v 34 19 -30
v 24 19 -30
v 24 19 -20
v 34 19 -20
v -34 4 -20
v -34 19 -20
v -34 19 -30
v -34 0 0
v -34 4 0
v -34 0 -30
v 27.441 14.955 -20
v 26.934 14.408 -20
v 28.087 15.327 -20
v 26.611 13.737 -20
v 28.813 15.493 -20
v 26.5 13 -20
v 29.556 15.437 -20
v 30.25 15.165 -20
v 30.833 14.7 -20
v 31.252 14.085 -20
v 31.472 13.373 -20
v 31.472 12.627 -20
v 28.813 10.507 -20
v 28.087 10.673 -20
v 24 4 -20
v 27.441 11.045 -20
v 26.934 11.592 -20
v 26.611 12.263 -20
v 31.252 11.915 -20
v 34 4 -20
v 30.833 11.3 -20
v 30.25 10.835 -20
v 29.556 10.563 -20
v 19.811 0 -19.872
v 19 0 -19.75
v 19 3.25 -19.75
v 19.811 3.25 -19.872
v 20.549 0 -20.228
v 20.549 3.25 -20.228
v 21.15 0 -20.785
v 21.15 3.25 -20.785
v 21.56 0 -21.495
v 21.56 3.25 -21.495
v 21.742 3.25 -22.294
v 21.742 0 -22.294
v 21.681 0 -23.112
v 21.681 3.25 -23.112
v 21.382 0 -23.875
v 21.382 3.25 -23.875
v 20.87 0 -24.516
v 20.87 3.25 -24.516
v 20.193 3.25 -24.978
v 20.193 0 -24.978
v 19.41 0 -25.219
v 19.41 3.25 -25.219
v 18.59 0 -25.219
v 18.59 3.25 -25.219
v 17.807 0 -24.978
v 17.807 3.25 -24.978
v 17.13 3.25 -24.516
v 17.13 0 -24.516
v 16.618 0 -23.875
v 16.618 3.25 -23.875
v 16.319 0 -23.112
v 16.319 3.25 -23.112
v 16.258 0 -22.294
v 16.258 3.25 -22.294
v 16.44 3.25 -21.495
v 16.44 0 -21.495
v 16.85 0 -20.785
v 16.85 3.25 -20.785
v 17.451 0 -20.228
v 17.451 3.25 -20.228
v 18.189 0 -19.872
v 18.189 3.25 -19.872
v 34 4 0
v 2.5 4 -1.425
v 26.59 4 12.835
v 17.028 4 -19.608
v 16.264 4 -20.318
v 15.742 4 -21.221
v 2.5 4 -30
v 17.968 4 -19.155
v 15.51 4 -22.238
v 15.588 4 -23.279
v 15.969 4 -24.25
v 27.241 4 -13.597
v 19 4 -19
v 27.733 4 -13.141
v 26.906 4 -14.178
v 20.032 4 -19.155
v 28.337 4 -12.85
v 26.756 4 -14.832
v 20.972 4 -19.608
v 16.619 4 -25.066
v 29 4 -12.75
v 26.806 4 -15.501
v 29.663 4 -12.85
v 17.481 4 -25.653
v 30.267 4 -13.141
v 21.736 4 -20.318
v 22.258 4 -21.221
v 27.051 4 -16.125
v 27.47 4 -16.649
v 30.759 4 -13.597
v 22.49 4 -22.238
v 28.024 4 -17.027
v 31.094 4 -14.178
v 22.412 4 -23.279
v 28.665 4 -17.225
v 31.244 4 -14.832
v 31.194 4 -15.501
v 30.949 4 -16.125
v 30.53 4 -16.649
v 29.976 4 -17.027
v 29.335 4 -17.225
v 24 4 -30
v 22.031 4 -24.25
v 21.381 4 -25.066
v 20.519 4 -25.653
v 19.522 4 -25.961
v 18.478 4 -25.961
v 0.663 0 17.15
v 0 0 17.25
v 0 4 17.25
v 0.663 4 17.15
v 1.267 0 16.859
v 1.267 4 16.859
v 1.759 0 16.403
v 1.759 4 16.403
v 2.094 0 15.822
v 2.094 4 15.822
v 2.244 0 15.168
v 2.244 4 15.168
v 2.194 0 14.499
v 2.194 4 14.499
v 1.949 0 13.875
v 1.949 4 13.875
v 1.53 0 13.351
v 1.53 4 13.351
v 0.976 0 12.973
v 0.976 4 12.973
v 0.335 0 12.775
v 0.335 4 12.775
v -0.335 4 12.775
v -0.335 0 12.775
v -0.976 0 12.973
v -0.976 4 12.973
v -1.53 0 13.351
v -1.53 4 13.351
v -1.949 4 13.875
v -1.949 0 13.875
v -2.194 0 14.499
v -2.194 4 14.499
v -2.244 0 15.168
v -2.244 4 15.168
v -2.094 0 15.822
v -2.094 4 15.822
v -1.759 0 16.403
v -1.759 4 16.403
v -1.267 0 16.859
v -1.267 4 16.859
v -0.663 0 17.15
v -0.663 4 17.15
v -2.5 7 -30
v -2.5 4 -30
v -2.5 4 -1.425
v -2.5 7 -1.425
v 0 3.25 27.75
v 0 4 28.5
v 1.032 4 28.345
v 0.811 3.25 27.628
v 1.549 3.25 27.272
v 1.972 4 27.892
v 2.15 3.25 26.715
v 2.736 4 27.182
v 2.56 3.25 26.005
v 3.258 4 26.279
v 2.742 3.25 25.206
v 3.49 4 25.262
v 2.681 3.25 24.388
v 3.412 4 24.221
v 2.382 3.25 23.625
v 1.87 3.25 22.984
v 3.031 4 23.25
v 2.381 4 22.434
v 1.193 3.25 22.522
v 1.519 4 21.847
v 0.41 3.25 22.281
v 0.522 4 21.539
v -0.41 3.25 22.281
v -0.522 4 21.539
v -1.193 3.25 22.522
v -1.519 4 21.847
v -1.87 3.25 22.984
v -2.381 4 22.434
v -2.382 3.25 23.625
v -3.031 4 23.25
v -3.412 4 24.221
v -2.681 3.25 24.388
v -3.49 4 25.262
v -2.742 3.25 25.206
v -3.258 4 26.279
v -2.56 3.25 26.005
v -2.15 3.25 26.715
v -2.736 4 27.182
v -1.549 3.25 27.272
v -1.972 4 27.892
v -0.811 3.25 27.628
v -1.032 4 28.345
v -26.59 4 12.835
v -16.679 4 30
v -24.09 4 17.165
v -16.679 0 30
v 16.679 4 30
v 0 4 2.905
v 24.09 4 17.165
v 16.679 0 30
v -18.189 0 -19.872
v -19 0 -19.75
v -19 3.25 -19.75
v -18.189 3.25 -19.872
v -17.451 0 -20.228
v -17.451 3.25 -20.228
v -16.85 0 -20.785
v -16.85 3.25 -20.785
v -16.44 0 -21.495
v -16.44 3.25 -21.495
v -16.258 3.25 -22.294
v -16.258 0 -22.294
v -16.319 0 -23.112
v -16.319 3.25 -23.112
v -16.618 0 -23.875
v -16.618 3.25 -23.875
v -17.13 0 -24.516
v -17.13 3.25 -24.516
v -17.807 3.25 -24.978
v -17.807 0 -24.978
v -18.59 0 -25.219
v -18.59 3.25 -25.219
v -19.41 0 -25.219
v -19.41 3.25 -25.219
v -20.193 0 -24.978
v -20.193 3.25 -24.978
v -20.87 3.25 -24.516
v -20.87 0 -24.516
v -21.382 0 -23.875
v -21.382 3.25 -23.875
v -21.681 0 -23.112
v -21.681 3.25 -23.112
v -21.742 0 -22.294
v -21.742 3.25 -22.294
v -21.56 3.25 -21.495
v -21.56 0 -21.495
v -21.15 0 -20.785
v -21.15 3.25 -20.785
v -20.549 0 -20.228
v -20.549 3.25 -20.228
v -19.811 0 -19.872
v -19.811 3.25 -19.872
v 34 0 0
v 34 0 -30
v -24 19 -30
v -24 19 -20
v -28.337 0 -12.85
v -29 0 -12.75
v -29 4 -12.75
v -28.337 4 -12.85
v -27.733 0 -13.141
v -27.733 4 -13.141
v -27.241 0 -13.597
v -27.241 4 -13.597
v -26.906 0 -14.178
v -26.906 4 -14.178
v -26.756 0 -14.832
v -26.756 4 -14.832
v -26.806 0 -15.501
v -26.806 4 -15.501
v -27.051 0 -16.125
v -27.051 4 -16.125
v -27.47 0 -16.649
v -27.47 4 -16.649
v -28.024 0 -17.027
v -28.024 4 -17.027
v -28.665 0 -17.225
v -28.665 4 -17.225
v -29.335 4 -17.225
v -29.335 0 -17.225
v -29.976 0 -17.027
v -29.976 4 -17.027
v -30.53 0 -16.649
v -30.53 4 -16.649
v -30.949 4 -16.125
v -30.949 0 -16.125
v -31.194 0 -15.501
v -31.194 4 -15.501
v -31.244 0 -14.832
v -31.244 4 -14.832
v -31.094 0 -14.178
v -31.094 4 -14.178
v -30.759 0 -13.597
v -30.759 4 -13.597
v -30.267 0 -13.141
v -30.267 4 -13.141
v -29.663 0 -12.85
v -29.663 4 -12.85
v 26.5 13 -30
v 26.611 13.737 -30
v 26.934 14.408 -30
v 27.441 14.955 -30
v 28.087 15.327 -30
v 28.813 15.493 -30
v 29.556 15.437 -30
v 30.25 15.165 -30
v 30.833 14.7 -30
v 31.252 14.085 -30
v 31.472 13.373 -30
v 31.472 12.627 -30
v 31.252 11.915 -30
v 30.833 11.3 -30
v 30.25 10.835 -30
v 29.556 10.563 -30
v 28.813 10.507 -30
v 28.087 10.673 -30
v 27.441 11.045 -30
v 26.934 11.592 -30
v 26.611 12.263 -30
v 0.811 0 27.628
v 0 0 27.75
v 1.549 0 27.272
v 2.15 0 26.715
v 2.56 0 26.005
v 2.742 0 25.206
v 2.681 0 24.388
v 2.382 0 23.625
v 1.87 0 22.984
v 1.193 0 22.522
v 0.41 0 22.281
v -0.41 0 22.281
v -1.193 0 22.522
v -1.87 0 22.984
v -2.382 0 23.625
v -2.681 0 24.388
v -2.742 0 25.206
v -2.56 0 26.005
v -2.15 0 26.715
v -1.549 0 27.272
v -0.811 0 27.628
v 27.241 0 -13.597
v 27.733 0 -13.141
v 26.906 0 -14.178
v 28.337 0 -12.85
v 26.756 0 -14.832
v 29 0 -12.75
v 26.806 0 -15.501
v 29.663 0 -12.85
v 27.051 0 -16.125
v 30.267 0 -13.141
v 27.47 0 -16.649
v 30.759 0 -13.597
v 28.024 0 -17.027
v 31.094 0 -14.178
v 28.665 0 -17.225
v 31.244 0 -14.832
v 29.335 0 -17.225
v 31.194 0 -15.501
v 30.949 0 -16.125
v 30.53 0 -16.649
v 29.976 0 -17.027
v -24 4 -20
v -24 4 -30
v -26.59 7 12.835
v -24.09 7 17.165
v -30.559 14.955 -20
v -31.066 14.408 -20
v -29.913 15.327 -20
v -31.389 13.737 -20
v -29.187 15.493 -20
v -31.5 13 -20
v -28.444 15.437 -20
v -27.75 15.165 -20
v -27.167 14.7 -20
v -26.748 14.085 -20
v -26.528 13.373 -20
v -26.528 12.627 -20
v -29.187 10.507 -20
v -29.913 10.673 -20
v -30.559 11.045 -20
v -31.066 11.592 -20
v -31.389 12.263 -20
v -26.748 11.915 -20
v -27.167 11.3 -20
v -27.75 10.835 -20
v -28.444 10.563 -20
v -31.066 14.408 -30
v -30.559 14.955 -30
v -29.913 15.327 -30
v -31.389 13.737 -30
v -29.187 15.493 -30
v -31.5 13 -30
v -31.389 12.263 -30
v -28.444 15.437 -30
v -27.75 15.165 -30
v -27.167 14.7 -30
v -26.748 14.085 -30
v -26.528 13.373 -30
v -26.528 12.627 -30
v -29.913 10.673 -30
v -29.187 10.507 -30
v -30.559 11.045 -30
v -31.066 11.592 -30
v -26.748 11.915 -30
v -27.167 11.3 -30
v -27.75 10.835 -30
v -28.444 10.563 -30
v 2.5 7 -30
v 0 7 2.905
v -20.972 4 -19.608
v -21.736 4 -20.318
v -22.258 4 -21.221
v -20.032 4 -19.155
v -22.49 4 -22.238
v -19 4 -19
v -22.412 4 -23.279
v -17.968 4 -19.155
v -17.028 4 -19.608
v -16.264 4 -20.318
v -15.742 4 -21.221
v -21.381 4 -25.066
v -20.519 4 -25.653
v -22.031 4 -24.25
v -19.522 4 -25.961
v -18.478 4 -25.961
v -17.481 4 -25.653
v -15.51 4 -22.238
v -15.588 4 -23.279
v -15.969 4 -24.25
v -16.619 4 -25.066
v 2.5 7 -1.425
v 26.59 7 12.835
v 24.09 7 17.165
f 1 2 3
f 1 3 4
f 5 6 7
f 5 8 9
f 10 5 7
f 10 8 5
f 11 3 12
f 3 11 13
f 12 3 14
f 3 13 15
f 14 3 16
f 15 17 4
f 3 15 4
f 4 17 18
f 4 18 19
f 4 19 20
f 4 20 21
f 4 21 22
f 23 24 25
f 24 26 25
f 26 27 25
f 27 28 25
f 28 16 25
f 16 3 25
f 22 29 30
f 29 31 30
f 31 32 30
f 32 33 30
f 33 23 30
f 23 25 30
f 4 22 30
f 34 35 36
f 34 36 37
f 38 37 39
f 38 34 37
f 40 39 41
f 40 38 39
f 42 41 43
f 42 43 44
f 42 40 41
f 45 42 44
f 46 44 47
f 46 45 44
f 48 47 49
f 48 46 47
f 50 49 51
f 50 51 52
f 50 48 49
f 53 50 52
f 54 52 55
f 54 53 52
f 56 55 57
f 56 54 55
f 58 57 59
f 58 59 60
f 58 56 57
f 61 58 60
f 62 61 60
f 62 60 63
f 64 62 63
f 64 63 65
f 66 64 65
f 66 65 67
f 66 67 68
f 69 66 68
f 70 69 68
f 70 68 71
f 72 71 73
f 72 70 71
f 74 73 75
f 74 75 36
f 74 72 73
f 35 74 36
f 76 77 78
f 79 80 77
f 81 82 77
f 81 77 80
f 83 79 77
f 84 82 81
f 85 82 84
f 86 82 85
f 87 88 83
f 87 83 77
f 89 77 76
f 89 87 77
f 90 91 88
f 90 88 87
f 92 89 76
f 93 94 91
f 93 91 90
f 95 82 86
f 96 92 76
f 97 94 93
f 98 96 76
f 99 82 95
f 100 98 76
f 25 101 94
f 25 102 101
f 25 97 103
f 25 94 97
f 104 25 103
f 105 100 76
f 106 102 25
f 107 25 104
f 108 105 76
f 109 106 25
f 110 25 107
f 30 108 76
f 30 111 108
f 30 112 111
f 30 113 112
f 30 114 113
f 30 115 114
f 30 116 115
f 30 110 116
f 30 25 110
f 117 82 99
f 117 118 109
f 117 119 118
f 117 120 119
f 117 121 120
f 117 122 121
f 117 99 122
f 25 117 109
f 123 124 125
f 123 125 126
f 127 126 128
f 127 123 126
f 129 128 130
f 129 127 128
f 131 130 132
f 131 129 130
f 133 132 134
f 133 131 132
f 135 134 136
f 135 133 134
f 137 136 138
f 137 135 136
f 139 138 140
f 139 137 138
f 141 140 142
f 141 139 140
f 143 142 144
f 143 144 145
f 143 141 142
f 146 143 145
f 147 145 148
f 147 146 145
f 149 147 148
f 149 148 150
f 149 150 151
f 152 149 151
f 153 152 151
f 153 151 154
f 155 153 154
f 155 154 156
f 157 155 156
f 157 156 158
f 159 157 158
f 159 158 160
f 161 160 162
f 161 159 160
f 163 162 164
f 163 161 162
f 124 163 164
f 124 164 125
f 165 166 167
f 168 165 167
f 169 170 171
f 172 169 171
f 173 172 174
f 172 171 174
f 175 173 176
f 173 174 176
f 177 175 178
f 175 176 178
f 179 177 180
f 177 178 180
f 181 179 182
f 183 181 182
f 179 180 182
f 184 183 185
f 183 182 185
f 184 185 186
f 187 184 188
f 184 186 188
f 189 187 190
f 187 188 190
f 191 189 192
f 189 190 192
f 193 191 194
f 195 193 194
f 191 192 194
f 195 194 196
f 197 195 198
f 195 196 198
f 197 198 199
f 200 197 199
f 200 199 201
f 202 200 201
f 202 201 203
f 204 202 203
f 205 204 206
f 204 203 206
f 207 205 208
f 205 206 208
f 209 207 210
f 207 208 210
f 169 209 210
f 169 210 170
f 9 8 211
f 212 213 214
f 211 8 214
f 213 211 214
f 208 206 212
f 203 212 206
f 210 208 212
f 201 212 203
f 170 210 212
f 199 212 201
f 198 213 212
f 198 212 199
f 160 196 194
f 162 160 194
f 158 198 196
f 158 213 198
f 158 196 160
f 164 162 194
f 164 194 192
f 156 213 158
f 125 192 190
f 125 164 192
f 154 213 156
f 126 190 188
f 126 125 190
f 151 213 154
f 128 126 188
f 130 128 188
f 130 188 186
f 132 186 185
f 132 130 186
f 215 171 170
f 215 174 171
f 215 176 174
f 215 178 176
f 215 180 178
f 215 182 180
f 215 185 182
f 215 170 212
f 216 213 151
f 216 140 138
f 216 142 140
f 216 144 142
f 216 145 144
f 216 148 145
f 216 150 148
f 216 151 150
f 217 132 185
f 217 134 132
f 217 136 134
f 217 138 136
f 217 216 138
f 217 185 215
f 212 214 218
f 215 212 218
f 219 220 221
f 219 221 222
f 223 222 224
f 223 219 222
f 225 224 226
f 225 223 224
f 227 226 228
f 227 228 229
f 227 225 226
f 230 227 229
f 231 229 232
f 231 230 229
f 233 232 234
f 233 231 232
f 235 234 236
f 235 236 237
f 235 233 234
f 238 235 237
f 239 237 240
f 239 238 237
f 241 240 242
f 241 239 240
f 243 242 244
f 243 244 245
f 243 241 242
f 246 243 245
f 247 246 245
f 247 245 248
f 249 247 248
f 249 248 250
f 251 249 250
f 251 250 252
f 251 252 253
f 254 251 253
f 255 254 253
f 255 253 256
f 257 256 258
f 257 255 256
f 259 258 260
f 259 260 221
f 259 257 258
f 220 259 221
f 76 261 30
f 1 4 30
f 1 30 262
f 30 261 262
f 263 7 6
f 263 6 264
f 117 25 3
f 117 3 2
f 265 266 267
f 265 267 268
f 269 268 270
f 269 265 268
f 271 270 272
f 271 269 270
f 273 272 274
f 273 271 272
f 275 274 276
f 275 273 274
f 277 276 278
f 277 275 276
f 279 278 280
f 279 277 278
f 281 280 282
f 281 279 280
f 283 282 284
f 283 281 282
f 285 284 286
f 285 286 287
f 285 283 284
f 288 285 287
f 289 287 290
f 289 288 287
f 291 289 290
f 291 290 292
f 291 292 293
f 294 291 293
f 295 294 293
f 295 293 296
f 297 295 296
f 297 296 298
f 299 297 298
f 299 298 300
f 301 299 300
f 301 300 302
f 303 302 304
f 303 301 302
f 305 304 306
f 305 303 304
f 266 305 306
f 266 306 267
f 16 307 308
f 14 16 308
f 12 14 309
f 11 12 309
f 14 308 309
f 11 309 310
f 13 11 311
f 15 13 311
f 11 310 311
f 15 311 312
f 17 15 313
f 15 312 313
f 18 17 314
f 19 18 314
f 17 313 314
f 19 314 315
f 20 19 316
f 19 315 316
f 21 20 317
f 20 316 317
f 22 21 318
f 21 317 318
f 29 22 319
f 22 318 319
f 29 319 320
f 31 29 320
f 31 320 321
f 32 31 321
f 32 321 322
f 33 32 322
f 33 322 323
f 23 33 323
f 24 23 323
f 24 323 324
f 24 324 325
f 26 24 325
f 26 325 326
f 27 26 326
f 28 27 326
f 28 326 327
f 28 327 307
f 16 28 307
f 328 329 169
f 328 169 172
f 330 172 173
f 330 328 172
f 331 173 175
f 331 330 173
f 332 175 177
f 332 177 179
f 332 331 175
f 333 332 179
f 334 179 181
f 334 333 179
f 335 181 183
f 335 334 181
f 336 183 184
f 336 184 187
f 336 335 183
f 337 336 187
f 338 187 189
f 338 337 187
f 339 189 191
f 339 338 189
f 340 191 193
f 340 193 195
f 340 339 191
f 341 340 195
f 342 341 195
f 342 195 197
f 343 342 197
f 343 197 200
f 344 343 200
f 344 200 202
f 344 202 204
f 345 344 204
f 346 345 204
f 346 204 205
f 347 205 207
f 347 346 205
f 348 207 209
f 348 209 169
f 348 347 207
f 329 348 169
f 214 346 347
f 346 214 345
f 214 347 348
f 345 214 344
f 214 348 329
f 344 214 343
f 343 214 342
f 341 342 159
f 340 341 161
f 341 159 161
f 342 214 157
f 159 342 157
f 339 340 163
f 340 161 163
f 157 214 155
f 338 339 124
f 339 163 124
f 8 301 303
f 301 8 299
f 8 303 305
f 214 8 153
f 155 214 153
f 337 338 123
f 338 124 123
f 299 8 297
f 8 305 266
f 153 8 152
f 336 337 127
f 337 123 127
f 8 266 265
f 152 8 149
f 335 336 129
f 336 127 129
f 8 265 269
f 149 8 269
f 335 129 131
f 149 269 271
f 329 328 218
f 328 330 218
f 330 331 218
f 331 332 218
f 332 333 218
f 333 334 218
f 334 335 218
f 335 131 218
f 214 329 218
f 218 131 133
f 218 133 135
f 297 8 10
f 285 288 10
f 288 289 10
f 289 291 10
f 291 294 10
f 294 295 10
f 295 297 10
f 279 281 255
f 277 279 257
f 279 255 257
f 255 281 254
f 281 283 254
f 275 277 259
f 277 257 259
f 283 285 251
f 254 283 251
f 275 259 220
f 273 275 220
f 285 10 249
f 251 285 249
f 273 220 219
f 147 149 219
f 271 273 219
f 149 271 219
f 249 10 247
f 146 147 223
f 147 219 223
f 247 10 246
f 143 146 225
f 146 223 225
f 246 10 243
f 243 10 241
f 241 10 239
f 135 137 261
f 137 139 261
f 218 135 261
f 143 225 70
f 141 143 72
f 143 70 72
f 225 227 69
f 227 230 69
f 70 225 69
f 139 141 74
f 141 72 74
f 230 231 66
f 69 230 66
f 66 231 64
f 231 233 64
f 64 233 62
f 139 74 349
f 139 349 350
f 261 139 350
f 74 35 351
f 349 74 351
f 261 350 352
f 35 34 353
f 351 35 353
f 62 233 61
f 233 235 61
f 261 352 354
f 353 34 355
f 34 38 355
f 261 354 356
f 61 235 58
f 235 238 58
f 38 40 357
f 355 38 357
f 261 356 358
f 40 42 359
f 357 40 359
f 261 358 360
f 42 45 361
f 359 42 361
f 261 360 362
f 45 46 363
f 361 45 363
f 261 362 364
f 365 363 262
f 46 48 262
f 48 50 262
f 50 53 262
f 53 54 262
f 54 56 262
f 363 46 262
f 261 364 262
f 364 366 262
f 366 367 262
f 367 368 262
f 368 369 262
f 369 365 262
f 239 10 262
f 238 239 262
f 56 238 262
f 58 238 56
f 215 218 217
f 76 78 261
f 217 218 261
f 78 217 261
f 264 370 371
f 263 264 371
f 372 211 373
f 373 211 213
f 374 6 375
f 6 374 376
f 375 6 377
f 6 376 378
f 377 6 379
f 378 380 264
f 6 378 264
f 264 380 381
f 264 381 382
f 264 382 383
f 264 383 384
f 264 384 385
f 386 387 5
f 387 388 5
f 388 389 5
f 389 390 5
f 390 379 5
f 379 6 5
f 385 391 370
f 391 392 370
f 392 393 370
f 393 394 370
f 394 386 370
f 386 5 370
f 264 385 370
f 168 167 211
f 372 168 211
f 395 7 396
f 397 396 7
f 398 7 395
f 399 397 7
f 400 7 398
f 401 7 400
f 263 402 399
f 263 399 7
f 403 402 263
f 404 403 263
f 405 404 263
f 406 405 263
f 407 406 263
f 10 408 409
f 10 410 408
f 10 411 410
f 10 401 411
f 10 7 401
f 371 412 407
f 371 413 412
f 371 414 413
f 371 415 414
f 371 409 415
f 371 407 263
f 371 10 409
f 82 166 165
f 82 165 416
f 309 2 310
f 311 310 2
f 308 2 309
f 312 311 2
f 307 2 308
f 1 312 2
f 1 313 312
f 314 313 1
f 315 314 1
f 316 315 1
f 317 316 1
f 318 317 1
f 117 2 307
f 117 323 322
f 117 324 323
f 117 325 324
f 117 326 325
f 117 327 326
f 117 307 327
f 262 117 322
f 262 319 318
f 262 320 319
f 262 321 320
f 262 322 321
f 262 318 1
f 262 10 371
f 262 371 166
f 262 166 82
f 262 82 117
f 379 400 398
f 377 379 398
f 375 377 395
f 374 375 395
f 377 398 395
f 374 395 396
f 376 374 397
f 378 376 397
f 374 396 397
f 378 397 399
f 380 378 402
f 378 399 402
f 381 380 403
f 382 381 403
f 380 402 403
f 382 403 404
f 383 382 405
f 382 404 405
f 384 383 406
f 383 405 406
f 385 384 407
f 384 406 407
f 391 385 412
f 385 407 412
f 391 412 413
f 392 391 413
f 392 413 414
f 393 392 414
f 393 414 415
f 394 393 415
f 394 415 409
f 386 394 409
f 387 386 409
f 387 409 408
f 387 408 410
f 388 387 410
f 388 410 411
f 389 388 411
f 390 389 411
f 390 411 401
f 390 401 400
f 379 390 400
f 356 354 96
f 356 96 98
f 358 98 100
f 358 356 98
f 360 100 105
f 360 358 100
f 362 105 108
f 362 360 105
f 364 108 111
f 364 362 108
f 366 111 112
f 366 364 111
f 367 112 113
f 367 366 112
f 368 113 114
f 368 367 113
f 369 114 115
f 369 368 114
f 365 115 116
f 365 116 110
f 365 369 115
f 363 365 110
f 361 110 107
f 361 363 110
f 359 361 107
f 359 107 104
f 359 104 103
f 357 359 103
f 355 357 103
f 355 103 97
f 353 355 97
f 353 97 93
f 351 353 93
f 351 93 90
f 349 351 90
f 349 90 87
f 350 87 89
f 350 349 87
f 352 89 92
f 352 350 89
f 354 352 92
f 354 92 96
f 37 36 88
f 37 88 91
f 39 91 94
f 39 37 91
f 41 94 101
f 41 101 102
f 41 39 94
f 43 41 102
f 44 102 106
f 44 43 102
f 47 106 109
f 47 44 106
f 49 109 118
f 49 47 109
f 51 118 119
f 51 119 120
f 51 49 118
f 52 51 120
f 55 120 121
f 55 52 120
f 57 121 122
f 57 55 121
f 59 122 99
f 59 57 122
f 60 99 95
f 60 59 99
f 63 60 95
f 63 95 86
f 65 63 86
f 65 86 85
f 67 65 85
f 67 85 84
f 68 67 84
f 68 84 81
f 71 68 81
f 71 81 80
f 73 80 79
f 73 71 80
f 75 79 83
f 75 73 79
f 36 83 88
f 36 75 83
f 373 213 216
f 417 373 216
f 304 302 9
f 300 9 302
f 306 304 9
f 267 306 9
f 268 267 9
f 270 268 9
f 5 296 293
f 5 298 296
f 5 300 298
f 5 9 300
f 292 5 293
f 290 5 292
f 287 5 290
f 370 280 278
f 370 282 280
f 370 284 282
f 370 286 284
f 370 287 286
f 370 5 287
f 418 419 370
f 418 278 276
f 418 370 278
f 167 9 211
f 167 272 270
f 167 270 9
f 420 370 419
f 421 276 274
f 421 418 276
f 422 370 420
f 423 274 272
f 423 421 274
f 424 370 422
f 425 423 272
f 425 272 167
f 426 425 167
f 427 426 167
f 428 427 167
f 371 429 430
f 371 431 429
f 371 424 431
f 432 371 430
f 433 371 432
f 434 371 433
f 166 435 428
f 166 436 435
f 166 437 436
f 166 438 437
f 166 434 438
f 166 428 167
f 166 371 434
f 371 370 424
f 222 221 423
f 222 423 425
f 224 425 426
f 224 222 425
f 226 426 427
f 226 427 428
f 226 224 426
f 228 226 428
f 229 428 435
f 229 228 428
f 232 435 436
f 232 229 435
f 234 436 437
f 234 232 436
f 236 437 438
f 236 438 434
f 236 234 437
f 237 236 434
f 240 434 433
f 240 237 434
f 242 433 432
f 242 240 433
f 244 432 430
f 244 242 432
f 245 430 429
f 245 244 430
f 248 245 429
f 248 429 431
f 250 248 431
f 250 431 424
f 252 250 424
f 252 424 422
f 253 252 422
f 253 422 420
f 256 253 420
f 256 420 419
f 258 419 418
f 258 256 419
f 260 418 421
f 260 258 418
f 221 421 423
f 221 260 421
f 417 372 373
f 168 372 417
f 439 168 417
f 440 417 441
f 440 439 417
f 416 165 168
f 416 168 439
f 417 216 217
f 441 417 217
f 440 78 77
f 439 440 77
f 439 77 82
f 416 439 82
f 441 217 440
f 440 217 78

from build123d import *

# Parameters (mm, degrees)
SKETCH1_R           = 2.75
SKETCH1_R_2         = 2.25
BOSS_EXTRUDE1_DEPTH = 4
BOSS_EXTRUDE2_DEPTH = 3
SKETCH3_W           = 10
SKETCH3_H           = 10
BOSS_EXTRUDE3_DEPTH = 15
SKETCH4_R           = 2.5
CUT_EXTRUDE1_DEPTH  = 72.533209071
CHAMFER1_SIZE       = 0.75


with BuildPart() as part:
    # Sketch1 → Boss-Extrude1 (new body)
    with BuildSketch(Plane(origin=(0, 0, 0), x_dir=(1, 0, 0), z_dir=(0, 1, 0))):
        Polygon((-16.679491924, -30), (16.679491924, -30), (34, 0), (34, 30), (-34, 30), (-34, 0), align=None)
        with Locations(Location((-19, 22.5, 0), (0, 0, 270))):
            Circle(SKETCH1_R, mode=Mode.SUBTRACT)
        with Locations(Location((19, 22.5, 0), (0, 0, 270))):
            Circle(SKETCH1_R, mode=Mode.SUBTRACT)
        with Locations(Location((0, -25, 0), (0, 0, 270))):
            Circle(SKETCH1_R, mode=Mode.SUBTRACT)
        with Locations(Location((-29, 15, 0), (0, 0, 270))):
            Circle(SKETCH1_R_2, mode=Mode.SUBTRACT)
        with Locations(Location((29, 15, 0), (0, 0, 270))):
            Circle(SKETCH1_R_2, mode=Mode.SUBTRACT)
        with Locations(Location((0, -15, 0), (0, 0, 270))):
            Circle(SKETCH1_R_2, mode=Mode.SUBTRACT)
    extrude(amount=BOSS_EXTRUDE1_DEPTH)

    # Sketch2 → Boss-Extrude2 (add)
    with BuildSketch(Plane(origin=(0, 4, 0), x_dir=(1, 0, 0), z_dir=(0, 1, 0))):
        Polygon((-26.589820012, -12.834808232), (-24.089671912, -17.165191768), (0, -2.905179879), (24.089671912, -17.165191768), (26.589820012, -12.834808232), (2.5, 1.425291326), (2.5, 30), (-2.5, 30), (-2.5, 1.425291326), align=None)
    extrude(amount=BOSS_EXTRUDE2_DEPTH)

    # Sketch3 → Boss-Extrude3 (add)
    with BuildSketch(Plane(origin=(0, 4, 0), x_dir=(1, 0, 0), z_dir=(0, 1, 0))):
        with Locations((-29, 25)):
            Rectangle(SKETCH3_W, SKETCH3_H)
        with Locations((29, 25)):
            Rectangle(SKETCH3_W, SKETCH3_H)
    extrude(amount=BOSS_EXTRUDE3_DEPTH)

    # Sketch4 → Cut-Extrude1 (cut, through all)
    with BuildSketch(Plane(origin=(0, 0, -30), x_dir=(-1, 0, 0), z_dir=(0, 0, -1))):
        with Locations((-29, 13)):
            Circle(SKETCH4_R)
        with Locations((29, 13)):
            Circle(SKETCH4_R)
    extrude(amount=-CUT_EXTRUDE1_DEPTH, mode=Mode.SUBTRACT)

    # Chamfer1
    chamfer1_edges = [part.edges().sort_by_distance(p)[0] for p in [
        (-19, 4, -25.25),
        (19, 4, -25.25),
        (0, 4, 22.25),
    ]]
    chamfer(chamfer1_edges, length=CHAMFER1_SIZE)


solid = part.part
